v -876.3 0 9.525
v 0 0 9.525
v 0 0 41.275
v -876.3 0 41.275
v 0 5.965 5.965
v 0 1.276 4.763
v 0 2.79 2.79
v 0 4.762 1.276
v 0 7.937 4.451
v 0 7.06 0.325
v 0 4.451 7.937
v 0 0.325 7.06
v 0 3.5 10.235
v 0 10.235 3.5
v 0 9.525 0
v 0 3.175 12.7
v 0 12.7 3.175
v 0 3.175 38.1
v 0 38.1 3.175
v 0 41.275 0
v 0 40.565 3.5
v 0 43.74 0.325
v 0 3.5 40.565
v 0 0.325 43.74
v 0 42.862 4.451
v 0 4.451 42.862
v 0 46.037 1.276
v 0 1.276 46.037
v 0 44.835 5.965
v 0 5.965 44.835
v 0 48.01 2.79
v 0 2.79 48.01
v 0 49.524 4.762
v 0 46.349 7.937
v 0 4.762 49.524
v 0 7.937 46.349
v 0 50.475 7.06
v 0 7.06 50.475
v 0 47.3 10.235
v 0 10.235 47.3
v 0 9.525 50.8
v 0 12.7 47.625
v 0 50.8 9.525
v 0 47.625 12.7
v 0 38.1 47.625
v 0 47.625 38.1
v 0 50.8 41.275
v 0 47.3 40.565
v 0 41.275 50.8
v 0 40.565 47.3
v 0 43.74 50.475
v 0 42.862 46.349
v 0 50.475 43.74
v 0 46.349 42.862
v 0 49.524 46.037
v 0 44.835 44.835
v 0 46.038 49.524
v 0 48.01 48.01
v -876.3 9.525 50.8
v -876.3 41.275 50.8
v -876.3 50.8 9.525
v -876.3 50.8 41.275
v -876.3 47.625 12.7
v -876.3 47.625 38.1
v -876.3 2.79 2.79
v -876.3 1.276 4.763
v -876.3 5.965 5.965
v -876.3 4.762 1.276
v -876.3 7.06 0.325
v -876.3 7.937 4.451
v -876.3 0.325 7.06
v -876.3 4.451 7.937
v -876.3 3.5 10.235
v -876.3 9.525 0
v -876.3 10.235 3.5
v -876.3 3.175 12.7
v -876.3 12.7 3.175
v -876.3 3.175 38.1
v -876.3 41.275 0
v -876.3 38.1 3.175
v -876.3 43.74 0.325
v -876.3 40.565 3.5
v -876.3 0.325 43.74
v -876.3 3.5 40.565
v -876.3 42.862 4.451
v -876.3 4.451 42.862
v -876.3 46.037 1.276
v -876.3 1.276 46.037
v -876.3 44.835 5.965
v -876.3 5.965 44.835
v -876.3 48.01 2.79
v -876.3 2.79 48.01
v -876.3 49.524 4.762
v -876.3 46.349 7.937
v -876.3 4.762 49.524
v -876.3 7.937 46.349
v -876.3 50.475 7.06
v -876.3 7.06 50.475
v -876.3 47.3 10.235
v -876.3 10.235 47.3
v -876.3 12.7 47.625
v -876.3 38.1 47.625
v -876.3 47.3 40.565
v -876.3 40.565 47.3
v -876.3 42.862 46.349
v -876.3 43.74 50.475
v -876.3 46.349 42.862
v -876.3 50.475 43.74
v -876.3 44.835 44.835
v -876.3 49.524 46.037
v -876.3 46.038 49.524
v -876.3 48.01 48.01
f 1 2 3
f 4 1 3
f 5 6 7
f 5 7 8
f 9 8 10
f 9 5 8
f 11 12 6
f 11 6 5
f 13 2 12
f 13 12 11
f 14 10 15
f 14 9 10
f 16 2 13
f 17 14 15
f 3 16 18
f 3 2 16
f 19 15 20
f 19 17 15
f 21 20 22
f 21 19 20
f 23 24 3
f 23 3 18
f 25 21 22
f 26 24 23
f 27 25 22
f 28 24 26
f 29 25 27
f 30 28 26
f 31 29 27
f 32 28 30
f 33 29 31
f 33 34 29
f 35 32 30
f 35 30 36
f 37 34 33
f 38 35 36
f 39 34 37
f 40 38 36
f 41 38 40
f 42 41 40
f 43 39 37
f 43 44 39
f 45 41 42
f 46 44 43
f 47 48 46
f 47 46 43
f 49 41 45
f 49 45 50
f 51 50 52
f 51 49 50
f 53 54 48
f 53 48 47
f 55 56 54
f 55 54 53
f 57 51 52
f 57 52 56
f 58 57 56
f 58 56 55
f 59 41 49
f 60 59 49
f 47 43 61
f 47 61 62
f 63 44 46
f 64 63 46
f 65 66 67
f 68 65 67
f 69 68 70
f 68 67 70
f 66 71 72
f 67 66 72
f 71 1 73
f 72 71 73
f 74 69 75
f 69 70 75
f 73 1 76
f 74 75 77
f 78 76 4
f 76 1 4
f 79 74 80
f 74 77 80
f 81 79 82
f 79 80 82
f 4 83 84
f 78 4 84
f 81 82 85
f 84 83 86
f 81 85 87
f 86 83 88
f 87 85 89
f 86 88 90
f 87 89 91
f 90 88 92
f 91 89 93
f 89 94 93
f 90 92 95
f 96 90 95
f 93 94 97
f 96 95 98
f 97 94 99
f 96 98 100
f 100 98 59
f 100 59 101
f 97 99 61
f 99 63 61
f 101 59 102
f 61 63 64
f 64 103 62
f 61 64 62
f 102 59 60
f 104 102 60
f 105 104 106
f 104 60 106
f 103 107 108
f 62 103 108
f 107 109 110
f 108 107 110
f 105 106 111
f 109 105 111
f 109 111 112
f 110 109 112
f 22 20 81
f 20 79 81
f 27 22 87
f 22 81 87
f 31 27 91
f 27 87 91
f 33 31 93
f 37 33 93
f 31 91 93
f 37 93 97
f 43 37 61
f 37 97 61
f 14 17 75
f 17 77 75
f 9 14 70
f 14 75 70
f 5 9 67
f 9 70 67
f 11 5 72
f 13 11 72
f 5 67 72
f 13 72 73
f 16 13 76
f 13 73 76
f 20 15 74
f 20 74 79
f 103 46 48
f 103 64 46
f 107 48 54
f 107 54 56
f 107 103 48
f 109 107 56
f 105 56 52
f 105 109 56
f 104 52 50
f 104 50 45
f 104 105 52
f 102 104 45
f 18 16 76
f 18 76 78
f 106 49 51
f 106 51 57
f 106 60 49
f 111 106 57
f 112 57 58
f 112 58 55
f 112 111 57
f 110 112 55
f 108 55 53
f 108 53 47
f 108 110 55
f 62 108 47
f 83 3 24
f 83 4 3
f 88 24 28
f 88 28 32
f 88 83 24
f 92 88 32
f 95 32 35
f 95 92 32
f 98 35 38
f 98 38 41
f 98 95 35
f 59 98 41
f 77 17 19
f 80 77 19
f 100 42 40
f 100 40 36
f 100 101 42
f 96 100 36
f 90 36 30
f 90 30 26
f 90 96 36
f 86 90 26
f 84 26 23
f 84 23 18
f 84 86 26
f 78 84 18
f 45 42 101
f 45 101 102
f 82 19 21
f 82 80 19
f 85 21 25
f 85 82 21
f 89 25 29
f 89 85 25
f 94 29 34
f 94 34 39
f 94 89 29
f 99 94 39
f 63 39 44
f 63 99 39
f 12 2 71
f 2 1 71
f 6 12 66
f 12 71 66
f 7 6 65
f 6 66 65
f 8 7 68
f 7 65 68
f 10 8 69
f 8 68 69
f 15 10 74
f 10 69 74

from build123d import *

# Parameters (mm, degrees)
F0_W     = 50.8
F0_H     = 50.8
F1_DEPTH = 876.3
F2_W     = 44.45
F2_H     = 44.45
F3_DEPTH = 876.3
F4_R     = 9.525


with BuildPart() as f1:
    # F0 (on Right) → F1 (new body)
    with BuildSketch(Plane.YZ):
        with Locations((25.4, 25.4)):
            Rectangle(F0_W, F0_H)
    extrude(amount=-F1_DEPTH)

    # F2 (on face) → F3 (cut)
    with BuildSketch(Plane.YZ):
        with Locations((25.4, 25.4)):
            Rectangle(F2_W, F2_H)
    extrude(amount=-F3_DEPTH, mode=Mode.SUBTRACT)

    # F4
    f4_edges = [f1.edges().sort_by_distance(p)[0] for p in [
        (-438.15, 3.175, 3.175),
        (-438.15, 47.625, 3.175),
        (-438.15, 47.625, 47.625),
        (-438.15, 3.175, 47.625),
        (-438.15, 50.8, 0),
        (-438.15, 50.8, 50.8),
        (-438.15, 0, 50.8),
        (-438.15, 0, 0),
    ]]
    fillet(f4_edges, radius=F4_R)


solid = f1.part
